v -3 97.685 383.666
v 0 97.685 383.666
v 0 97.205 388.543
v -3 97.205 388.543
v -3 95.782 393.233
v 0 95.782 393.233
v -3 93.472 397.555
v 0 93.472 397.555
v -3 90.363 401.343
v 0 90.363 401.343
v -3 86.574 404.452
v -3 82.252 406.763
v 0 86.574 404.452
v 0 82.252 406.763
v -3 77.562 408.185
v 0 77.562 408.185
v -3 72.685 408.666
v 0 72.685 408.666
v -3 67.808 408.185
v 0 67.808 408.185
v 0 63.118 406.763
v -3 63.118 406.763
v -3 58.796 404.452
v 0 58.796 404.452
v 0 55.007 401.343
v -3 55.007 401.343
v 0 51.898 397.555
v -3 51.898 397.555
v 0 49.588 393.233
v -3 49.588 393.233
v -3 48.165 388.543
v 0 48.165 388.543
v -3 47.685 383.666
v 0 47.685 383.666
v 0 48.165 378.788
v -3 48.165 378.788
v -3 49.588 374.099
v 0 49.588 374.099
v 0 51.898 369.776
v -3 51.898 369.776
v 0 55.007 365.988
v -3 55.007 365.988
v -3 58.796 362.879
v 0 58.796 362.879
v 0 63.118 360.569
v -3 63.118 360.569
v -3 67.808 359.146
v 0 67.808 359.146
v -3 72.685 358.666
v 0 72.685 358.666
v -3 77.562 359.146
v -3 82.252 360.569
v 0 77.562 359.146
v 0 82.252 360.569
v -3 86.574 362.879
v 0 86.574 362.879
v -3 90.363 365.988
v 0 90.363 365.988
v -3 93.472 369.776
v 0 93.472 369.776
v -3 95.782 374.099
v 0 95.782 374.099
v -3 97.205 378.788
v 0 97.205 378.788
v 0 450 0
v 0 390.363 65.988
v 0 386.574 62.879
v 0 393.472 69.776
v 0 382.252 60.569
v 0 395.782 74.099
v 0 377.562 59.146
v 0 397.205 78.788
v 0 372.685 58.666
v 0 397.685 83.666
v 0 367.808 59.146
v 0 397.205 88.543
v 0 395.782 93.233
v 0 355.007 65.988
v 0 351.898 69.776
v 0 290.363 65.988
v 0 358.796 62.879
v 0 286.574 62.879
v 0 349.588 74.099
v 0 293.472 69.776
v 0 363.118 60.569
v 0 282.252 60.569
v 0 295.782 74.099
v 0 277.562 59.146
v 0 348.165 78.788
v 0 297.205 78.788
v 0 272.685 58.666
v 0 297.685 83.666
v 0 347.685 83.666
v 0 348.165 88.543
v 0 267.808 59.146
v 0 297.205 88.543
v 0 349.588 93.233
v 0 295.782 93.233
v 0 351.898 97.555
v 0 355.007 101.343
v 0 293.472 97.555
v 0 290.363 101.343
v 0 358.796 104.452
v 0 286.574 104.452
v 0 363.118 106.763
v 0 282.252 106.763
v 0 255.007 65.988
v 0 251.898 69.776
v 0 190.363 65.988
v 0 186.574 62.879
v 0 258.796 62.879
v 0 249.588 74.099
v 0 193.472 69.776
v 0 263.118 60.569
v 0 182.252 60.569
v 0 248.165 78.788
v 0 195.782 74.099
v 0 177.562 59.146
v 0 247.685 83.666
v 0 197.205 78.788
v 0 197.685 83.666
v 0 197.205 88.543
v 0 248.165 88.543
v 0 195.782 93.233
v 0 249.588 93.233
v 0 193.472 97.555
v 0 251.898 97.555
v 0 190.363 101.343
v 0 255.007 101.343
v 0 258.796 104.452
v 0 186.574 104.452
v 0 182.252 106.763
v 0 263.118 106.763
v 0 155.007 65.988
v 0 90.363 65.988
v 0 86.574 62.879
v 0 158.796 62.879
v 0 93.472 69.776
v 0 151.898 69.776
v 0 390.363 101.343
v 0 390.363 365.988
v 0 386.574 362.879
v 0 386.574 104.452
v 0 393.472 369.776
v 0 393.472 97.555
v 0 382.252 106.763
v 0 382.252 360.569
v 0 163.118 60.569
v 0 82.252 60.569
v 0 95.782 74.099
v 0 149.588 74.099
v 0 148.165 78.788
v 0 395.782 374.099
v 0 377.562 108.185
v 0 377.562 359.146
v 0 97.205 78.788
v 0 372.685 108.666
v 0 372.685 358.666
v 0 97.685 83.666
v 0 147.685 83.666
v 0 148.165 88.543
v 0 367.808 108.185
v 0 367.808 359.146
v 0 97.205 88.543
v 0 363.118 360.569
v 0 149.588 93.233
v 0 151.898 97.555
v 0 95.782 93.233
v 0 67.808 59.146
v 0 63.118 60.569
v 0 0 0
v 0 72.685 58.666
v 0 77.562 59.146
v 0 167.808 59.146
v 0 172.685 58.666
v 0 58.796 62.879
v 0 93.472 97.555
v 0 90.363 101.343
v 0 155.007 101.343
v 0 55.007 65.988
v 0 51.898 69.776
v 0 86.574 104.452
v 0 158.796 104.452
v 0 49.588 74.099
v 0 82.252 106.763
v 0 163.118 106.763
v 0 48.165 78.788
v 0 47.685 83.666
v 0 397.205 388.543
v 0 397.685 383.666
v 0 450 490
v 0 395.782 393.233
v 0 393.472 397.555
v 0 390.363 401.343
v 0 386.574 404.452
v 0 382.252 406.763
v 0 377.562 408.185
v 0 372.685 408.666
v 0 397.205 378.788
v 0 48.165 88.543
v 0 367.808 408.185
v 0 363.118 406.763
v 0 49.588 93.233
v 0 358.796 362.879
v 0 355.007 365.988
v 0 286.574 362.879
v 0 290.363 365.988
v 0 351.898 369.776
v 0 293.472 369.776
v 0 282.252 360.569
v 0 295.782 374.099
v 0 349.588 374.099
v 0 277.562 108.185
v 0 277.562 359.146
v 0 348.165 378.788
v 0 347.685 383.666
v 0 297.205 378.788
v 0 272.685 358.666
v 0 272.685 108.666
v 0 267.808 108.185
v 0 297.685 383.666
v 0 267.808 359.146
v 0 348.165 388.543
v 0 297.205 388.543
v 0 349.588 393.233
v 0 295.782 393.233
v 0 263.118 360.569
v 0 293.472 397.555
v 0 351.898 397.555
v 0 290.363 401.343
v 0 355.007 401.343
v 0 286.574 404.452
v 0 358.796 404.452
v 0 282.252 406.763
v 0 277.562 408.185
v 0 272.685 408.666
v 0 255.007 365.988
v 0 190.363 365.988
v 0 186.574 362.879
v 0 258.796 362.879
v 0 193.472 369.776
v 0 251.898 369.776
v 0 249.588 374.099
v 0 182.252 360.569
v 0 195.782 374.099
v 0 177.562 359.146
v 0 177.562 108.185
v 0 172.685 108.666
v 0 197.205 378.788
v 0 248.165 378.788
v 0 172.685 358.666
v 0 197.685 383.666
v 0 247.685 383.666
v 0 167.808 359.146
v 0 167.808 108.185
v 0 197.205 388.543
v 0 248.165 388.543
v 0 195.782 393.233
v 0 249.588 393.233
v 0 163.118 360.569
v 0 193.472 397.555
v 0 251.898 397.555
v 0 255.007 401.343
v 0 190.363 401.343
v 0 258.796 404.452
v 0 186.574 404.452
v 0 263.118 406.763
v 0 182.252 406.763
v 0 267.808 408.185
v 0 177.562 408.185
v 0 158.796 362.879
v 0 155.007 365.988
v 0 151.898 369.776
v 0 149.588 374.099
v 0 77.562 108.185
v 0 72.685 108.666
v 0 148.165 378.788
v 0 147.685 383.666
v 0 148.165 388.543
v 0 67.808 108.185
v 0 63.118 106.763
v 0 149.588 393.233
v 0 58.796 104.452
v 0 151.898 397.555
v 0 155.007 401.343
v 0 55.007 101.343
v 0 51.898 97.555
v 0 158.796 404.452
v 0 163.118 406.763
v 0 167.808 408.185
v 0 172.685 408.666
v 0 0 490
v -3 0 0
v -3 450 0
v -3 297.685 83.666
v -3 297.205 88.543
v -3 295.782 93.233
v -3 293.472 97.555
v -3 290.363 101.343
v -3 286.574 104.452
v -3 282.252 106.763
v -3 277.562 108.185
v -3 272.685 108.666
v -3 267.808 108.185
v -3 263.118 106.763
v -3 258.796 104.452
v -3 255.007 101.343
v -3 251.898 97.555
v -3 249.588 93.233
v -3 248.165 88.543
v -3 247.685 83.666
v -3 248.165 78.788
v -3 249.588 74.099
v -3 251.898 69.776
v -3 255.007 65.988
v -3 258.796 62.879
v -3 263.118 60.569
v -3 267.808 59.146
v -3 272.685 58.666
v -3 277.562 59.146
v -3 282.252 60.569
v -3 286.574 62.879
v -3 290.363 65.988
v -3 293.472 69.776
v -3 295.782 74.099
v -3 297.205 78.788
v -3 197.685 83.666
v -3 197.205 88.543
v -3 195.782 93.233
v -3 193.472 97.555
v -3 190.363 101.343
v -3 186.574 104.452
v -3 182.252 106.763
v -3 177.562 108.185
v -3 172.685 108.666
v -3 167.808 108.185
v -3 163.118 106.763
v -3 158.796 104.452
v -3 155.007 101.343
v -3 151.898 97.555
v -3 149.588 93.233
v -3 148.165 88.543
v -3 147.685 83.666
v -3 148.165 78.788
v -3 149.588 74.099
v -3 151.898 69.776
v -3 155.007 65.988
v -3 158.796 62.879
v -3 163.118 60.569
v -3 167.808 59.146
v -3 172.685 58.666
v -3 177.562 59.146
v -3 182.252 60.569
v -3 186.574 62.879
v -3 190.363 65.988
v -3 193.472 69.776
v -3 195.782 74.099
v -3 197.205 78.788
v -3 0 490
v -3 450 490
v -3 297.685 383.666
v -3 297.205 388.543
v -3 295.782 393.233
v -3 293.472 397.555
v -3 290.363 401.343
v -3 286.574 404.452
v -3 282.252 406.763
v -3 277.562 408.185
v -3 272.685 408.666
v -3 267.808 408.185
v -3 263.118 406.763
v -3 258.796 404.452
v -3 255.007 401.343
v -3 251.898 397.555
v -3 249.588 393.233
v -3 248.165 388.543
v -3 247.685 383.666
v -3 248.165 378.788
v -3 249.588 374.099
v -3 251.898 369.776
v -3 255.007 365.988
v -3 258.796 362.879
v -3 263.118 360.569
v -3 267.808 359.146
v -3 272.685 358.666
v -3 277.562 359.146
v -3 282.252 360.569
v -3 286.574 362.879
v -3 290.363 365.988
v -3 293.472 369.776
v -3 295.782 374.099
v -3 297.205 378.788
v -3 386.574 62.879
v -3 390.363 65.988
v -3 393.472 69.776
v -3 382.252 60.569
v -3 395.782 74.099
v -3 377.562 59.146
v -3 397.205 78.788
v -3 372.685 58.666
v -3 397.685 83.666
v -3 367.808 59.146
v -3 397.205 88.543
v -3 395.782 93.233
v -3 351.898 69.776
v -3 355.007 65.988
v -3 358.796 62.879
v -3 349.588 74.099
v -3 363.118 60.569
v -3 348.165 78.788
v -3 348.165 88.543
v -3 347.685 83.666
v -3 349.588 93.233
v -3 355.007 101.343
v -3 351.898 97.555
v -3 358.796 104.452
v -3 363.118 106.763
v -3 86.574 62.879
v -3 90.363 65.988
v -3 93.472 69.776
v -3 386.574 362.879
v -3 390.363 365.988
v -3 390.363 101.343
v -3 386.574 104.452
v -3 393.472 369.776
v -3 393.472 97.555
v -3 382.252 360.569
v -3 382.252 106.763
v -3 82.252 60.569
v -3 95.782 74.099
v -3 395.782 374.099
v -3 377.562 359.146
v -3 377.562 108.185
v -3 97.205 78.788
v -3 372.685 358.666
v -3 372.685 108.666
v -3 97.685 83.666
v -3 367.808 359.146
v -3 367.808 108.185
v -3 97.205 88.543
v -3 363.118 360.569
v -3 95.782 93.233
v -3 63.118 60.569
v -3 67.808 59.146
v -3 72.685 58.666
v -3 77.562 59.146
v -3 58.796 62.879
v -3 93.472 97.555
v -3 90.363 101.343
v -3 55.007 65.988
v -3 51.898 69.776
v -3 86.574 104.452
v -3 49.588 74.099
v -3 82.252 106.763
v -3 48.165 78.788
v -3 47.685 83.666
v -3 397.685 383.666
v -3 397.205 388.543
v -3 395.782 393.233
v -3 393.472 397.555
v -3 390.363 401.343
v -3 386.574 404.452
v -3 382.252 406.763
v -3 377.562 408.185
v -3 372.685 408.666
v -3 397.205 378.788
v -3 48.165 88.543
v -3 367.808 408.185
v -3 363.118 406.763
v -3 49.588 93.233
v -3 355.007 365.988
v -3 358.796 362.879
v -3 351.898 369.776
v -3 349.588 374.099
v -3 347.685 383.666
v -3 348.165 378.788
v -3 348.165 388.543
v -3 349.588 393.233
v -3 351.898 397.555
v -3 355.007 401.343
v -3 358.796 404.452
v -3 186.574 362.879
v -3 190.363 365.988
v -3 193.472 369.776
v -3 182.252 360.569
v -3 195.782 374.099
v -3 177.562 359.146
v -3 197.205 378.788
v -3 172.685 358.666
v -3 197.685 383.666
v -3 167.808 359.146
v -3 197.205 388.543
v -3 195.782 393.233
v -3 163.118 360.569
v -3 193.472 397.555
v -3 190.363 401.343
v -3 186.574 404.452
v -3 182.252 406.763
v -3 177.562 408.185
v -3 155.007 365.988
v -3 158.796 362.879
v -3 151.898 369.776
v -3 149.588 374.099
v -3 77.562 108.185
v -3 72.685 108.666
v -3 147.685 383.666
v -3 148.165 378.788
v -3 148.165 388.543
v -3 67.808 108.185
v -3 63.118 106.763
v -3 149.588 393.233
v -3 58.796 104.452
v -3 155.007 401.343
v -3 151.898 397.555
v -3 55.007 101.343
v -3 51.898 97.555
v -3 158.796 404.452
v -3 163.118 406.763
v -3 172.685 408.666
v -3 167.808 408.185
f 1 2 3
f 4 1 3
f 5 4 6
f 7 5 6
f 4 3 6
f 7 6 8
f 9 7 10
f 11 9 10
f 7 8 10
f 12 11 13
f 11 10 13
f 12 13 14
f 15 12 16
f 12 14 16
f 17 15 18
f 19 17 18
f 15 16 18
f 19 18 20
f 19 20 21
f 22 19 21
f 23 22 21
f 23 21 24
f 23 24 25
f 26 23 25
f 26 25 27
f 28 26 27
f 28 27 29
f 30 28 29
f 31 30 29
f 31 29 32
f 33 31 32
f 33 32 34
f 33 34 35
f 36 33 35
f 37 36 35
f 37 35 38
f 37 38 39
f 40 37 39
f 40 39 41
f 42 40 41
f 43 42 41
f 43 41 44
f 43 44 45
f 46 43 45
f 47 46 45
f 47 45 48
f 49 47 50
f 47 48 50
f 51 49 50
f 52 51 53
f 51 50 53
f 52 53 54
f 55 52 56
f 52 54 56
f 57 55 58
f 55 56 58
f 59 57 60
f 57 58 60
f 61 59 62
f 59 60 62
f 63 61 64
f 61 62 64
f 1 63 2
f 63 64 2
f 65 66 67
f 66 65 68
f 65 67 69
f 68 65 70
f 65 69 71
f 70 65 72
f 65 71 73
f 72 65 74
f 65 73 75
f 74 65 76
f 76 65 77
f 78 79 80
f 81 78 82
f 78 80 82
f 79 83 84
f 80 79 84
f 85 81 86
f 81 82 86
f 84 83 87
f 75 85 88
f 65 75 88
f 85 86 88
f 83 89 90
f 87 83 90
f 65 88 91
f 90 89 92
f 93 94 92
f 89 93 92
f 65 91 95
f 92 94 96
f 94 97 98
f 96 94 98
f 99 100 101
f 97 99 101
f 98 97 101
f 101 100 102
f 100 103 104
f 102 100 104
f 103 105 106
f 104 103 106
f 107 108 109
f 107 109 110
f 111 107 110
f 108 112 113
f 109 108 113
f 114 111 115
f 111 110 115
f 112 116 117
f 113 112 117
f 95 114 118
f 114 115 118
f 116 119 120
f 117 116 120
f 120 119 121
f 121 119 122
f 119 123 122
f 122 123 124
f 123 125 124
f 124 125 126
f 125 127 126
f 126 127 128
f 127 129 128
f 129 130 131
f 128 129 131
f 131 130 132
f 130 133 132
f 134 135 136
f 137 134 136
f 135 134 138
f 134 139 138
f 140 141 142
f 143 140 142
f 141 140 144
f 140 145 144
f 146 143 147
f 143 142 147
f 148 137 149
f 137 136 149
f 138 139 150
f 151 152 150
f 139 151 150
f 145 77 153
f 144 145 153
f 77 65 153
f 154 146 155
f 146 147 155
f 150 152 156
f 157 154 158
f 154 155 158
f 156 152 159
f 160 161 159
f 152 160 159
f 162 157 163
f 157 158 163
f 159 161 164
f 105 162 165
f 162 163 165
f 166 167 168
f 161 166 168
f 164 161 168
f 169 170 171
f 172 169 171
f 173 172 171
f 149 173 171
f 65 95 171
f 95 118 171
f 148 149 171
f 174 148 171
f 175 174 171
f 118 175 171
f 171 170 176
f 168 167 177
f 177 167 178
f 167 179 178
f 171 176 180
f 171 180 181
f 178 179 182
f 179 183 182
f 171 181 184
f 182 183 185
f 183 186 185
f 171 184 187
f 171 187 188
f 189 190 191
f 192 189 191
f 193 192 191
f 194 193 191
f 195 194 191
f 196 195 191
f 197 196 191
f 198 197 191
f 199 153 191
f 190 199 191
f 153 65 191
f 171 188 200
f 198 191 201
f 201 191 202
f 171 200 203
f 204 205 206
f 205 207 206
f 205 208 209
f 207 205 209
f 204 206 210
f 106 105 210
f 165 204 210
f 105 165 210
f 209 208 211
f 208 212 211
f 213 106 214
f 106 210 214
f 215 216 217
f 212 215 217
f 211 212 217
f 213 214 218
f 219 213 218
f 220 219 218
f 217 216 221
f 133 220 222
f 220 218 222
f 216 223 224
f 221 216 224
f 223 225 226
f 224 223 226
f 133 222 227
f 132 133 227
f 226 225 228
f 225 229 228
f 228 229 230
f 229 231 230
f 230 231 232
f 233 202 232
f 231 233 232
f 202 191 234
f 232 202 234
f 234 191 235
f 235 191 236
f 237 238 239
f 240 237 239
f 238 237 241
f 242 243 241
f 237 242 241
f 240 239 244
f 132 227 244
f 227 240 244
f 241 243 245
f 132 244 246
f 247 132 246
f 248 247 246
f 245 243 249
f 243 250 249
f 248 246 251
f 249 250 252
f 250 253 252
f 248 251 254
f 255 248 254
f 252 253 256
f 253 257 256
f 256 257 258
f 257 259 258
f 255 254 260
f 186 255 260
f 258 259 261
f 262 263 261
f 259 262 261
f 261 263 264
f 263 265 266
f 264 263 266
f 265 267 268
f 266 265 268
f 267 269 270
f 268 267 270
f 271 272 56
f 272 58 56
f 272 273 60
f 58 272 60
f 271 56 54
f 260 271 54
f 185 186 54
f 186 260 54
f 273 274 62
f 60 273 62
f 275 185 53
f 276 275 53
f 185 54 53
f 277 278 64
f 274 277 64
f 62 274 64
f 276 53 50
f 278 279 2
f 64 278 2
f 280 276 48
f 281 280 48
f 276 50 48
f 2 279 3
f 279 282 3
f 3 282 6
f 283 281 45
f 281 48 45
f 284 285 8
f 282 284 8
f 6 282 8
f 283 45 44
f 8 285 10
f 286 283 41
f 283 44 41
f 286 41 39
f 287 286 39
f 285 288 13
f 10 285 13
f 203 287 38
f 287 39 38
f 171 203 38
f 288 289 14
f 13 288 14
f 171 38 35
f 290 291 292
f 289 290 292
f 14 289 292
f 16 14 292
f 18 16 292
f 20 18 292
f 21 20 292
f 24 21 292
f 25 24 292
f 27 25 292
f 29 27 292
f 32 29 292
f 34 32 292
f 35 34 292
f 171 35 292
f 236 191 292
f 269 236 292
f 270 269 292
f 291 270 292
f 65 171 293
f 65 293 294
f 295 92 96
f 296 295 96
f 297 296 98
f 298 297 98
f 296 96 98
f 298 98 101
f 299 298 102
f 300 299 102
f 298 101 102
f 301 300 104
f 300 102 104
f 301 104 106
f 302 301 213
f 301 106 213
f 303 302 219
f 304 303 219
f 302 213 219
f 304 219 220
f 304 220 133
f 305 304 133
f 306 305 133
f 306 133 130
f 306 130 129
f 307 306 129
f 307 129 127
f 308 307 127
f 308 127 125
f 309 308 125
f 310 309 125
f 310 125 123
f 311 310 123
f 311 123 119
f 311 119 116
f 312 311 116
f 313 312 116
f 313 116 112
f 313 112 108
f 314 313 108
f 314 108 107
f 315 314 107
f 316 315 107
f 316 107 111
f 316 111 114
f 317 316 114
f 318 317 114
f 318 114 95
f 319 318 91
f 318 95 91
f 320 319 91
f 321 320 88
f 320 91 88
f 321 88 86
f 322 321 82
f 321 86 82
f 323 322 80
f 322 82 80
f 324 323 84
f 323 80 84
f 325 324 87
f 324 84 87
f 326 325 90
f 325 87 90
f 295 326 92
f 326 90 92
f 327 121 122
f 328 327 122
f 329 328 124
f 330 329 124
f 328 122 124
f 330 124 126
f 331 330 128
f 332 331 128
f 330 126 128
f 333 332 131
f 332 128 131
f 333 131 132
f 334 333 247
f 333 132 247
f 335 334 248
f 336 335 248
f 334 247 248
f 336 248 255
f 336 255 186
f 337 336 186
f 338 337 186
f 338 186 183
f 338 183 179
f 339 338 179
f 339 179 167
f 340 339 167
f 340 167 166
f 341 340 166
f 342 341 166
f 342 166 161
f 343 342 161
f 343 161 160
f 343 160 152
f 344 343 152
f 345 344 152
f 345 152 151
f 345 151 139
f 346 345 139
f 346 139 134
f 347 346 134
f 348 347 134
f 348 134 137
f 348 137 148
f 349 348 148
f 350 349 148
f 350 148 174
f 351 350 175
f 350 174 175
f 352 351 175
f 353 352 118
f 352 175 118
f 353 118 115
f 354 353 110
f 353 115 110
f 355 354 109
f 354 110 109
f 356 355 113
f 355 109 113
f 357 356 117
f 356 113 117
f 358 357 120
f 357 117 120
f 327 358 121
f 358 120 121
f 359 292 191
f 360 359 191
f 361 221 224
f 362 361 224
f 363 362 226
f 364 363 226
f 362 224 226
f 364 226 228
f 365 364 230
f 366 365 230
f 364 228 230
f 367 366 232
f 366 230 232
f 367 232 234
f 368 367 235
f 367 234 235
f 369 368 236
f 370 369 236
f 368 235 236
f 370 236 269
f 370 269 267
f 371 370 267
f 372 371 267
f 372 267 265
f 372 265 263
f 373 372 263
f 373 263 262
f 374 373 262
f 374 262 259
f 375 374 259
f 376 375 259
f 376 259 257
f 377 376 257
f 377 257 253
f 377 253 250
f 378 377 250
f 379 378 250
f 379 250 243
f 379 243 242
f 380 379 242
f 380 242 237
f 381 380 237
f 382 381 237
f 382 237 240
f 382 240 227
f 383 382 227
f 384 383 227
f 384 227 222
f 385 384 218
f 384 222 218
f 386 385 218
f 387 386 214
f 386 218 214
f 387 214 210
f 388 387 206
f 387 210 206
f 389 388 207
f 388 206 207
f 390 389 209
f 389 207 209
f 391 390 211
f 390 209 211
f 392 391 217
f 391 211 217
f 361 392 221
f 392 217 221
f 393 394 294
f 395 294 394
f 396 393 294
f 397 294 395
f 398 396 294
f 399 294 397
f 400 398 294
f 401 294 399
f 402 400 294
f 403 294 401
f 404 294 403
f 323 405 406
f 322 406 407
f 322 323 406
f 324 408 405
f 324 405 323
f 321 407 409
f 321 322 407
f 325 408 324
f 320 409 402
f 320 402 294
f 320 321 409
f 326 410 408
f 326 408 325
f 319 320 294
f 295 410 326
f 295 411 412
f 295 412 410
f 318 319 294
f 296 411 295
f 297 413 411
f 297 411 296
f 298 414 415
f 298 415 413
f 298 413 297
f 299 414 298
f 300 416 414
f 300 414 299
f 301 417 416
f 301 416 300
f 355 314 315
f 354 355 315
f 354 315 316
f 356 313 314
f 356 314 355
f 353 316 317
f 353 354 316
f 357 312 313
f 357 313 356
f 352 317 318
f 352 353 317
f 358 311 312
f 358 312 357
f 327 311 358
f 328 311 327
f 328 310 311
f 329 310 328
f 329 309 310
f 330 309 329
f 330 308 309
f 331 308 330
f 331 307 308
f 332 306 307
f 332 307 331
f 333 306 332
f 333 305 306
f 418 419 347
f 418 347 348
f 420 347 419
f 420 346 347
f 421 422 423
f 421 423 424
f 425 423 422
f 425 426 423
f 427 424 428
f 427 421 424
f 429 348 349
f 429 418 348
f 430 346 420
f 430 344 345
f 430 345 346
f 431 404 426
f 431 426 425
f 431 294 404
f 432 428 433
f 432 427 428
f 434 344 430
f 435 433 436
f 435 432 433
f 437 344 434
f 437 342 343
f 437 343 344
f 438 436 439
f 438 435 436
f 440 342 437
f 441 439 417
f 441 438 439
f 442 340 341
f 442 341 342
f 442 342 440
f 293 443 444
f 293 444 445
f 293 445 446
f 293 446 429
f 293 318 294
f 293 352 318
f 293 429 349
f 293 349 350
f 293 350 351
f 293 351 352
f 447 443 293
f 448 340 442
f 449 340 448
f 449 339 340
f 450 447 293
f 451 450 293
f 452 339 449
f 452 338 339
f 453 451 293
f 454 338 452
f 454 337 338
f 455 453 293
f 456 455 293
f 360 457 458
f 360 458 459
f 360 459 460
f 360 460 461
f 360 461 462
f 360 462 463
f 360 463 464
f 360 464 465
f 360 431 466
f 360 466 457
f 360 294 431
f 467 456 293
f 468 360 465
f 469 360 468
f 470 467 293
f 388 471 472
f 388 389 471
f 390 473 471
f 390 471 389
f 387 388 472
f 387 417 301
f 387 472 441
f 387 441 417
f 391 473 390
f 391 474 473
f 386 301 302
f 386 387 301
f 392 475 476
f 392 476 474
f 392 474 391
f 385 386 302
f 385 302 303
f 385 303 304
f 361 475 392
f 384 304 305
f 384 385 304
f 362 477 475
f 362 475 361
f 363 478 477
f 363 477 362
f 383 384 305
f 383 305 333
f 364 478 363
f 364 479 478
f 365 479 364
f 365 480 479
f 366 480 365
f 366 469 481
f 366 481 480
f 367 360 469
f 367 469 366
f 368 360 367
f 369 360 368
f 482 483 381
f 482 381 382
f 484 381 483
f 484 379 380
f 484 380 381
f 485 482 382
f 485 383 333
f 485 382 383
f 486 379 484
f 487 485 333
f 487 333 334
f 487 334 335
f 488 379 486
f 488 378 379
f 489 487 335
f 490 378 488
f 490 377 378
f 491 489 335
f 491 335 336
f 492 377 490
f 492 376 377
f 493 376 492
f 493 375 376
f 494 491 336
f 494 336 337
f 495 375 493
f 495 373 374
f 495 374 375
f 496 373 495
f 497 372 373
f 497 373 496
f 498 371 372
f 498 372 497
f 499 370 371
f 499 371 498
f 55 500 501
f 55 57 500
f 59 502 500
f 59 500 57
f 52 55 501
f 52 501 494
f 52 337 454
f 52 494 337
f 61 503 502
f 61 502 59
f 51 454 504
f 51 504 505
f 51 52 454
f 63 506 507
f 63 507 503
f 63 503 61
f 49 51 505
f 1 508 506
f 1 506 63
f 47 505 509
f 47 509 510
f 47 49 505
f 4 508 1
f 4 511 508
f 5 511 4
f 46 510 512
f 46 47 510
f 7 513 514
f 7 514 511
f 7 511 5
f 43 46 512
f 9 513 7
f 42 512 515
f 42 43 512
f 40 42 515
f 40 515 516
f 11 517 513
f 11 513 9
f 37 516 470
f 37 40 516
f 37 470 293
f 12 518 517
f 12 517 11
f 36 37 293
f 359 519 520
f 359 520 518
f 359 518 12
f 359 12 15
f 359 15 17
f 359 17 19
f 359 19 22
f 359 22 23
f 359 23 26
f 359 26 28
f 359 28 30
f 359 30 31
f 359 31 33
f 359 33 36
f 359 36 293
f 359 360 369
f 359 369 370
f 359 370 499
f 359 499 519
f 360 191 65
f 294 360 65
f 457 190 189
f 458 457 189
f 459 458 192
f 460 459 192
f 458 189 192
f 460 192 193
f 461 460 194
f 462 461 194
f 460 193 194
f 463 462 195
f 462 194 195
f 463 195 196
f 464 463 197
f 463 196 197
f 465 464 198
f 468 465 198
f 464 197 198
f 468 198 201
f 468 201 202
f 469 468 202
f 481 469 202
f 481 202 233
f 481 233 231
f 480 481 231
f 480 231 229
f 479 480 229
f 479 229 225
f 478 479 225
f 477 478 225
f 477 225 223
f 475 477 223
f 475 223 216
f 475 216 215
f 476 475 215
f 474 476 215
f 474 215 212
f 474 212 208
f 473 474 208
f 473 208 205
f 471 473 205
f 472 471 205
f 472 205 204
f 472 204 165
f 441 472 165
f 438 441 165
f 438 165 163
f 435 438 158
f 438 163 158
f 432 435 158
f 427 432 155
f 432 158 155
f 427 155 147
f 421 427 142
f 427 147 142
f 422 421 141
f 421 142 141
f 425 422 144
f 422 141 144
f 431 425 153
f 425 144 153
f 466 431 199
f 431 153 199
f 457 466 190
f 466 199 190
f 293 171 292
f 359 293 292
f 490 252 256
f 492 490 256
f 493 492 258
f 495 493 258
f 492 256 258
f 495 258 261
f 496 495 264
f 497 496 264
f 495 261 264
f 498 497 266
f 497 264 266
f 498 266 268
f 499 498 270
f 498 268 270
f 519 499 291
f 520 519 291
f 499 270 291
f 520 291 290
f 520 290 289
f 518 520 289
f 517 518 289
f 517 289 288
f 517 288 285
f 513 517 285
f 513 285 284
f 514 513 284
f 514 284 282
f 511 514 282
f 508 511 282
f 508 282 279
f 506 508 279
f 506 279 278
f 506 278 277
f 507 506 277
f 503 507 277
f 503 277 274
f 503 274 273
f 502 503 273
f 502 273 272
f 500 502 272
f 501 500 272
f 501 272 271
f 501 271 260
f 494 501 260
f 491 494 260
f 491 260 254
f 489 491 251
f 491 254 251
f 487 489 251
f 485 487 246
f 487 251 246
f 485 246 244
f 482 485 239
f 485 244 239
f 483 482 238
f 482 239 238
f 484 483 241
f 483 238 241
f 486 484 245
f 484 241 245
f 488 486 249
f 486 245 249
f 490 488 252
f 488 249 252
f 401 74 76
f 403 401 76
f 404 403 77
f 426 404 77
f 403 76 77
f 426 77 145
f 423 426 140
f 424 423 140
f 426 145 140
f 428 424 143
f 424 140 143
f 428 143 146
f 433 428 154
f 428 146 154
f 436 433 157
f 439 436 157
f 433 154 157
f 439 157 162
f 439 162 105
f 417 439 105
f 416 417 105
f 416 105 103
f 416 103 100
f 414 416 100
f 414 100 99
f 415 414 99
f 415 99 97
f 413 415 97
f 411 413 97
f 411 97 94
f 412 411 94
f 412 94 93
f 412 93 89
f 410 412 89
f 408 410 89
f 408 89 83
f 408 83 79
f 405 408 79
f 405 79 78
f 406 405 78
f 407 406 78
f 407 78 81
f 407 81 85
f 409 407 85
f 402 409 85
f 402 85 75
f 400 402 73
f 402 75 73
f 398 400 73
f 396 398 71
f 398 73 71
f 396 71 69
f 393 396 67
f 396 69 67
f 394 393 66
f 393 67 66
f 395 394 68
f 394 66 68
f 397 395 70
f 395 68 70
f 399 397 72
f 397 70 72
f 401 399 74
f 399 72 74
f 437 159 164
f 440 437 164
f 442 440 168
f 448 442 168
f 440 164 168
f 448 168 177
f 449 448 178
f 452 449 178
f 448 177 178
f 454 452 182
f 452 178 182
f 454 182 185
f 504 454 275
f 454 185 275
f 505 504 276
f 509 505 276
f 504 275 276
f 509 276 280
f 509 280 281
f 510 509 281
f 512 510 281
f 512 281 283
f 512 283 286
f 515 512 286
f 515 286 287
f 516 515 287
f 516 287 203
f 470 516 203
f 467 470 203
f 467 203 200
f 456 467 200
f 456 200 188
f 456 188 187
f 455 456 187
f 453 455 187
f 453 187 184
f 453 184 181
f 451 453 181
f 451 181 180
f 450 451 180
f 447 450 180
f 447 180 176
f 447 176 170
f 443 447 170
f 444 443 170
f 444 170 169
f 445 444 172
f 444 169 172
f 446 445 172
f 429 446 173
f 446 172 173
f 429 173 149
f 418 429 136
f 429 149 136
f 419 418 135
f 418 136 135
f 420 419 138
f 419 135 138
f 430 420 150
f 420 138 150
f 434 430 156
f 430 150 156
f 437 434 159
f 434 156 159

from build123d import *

# Parameters (mm, degrees)
PAD_DEPTH    = 3
SKETCH003_R  = 25
POCKET_DEPTH = 3.001


with BuildPart() as part:
    # Sketch → Pad (new body)
    with BuildSketch(Plane.YZ):
        Polygon((0, 0), (0, 490), (450, 490), (450, 0), (225, 0), align=None)
    extrude(amount=-PAD_DEPTH)

    # Sketch003 → Pocket (cut, through all)
    with BuildSketch(Plane.YZ):
        with Locations((372.684972, 383.665641)):
            Circle(SKETCH003_R)
        with Locations((272.684972, 383.665641)):
            Circle(SKETCH003_R)
        with Locations((72.684972, 383.665641)):
            Circle(SKETCH003_R)
        with Locations((72.684972, 83.665641)):
            Circle(SKETCH003_R)
        with Locations((172.684972, 83.665641)):
            Circle(SKETCH003_R)
        with Locations((372.684972, 83.665641)):
            Circle(SKETCH003_R)
        with Locations((272.684972, 83.665641)):
            Circle(SKETCH003_R)
        with Locations((172.684972, 383.665641)):
            Circle(SKETCH003_R)
    extrude(amount=-POCKET_DEPTH, mode=Mode.SUBTRACT)


solid = part.part
